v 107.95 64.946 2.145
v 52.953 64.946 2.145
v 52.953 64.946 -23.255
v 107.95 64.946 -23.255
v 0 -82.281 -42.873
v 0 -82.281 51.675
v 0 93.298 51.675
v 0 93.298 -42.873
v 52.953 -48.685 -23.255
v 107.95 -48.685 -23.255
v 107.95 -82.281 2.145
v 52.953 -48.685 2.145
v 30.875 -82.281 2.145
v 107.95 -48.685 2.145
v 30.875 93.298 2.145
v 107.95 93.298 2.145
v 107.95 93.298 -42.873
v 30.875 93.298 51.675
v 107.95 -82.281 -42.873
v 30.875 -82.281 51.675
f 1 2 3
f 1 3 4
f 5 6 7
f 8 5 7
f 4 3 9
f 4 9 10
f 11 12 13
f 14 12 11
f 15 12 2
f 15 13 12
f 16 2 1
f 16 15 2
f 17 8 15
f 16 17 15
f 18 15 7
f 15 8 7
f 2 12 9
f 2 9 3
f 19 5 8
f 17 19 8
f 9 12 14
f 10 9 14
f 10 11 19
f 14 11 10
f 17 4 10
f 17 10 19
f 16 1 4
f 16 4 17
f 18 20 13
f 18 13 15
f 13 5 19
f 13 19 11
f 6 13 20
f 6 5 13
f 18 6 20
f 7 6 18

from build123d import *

# Parameters (mm, degrees)
F0_W     = 175.5796000361
F0_H     = 94.5478640497
F1_DEPTH = 107.95
F2_W     = 77.0752280027
F2_H     = 175.5796000361
F3_DEPTH = 49.53
F4_W     = 54.9968387008
F4_H     = 113.6317700148
F5_DEPTH = 25.4


with BuildPart() as f1:
    # F0 (on Right) → F1 (new body)
    with BuildSketch(Plane.YZ):
        with Locations((5.5083744228, 4.4014062732)):
            Rectangle(F0_W, F0_H)
    extrude(amount=F1_DEPTH)

    # F2 (on face) → F3 (cut)
    with BuildSketch(Plane.XY.offset(51.6753382981)):
        with Locations((69.4123859987, 5.5083744228)):
            Rectangle(F2_W, F2_H)
    extrude(amount=-F3_DEPTH, mode=Mode.SUBTRACT)

    # F4 (on face) → F5 (cut)
    with BuildSketch(Plane.XY.offset(2.1453382981)):
        with Locations((80.4515806496, 8.1303864717)):
            Rectangle(F4_W, F4_H)
    extrude(amount=-F5_DEPTH, mode=Mode.SUBTRACT)


solid = f1.part
